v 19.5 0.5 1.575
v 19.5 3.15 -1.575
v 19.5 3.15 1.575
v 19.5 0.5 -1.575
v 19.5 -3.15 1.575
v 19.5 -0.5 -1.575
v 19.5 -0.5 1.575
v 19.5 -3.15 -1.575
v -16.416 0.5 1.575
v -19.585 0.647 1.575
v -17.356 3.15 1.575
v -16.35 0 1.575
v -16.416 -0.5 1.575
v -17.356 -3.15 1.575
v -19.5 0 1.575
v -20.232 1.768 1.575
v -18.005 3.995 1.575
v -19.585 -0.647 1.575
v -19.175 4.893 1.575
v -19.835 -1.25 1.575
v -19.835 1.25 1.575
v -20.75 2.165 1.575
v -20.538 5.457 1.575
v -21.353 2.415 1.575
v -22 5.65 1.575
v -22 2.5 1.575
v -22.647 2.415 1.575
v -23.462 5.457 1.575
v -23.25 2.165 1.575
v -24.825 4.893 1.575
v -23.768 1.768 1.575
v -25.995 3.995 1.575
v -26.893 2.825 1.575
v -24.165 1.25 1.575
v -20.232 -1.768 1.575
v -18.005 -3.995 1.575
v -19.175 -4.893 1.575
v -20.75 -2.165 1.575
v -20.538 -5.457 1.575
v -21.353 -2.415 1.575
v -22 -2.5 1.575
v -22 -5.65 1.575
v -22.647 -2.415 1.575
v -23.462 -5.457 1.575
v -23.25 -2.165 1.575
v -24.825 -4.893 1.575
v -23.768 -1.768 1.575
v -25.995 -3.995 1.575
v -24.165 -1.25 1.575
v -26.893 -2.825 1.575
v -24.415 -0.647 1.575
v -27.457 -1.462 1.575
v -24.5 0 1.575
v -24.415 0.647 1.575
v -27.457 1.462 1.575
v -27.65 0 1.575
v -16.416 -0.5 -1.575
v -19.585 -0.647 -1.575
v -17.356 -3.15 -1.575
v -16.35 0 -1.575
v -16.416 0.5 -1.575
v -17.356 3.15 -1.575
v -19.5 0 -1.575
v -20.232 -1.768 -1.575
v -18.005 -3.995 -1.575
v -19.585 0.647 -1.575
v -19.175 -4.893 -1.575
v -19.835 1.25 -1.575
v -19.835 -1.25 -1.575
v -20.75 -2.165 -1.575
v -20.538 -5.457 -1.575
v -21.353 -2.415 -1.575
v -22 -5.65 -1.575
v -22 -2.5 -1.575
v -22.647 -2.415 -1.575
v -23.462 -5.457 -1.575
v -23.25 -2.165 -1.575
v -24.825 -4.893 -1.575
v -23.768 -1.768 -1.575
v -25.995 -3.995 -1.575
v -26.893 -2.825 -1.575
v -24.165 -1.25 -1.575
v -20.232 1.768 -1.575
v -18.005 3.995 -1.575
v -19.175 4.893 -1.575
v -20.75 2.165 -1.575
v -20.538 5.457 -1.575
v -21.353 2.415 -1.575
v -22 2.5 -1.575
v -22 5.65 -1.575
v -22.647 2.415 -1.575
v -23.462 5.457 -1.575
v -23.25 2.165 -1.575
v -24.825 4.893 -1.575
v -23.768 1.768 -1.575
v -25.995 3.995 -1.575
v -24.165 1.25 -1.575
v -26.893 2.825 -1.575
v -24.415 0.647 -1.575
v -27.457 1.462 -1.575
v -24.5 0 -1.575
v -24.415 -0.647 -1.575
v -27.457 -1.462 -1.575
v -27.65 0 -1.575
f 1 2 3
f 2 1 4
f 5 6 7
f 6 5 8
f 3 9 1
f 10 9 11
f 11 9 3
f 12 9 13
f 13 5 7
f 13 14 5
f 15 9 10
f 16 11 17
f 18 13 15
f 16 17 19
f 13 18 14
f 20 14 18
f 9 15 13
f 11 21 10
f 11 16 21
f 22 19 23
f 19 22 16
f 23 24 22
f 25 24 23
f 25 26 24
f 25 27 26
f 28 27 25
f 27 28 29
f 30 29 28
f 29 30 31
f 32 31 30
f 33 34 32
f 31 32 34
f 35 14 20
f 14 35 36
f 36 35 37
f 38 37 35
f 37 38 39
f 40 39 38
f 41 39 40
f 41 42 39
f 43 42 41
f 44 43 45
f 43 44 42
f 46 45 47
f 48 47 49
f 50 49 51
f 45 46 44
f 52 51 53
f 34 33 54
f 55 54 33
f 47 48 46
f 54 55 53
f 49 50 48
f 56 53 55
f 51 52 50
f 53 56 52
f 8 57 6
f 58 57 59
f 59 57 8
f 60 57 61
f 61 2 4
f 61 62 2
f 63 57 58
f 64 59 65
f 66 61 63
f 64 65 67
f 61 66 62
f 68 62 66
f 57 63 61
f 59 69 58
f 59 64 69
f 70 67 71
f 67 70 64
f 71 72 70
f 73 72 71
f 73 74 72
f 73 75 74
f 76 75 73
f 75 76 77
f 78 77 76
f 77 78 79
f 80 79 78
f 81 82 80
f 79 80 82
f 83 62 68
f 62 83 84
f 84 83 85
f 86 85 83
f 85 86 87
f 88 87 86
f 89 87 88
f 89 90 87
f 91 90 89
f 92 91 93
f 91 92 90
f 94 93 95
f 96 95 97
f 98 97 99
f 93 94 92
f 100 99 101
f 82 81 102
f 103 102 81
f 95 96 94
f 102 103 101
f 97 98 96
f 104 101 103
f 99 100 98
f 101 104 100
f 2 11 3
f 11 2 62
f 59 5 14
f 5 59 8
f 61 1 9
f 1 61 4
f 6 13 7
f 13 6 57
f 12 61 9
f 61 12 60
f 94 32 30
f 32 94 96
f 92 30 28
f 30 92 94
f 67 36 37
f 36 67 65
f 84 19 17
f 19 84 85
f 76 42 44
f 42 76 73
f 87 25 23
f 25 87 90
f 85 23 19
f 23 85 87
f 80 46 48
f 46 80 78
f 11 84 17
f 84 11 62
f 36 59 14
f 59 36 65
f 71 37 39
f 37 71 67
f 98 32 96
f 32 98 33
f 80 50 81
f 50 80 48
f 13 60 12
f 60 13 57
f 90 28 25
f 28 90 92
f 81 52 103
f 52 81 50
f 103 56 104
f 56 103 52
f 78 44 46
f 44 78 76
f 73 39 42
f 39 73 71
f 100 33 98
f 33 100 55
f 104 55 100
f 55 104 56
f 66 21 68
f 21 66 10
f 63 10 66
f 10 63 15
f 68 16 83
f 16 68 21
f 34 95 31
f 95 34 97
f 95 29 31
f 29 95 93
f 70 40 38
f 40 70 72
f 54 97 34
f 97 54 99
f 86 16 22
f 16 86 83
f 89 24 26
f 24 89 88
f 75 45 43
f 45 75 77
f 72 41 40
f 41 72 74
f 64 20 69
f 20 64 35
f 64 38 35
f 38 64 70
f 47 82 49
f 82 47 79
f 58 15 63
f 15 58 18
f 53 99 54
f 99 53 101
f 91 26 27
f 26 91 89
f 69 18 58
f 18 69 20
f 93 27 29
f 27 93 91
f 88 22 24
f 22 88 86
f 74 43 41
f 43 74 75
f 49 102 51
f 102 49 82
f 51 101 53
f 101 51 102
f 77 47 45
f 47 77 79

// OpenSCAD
width = 6.30;
gap = 1.0;
thickness = 3.15;
length = 39;
top_width = 28.0;
inside_loop = 5;
$fn=24;


difference() {
  cube([length, width, thickness], center = true);
  cube([length, gap, thickness], center = true);
}
translate([-length / 2 - inside_loop/2, 0, 0]) {
  difference() {
    cylinder(h=thickness, d=inside_loop + 2 * thickness, center = true);
    cylinder(h=thickness+0.01, d=inside_loop, center = true);
  }
}
